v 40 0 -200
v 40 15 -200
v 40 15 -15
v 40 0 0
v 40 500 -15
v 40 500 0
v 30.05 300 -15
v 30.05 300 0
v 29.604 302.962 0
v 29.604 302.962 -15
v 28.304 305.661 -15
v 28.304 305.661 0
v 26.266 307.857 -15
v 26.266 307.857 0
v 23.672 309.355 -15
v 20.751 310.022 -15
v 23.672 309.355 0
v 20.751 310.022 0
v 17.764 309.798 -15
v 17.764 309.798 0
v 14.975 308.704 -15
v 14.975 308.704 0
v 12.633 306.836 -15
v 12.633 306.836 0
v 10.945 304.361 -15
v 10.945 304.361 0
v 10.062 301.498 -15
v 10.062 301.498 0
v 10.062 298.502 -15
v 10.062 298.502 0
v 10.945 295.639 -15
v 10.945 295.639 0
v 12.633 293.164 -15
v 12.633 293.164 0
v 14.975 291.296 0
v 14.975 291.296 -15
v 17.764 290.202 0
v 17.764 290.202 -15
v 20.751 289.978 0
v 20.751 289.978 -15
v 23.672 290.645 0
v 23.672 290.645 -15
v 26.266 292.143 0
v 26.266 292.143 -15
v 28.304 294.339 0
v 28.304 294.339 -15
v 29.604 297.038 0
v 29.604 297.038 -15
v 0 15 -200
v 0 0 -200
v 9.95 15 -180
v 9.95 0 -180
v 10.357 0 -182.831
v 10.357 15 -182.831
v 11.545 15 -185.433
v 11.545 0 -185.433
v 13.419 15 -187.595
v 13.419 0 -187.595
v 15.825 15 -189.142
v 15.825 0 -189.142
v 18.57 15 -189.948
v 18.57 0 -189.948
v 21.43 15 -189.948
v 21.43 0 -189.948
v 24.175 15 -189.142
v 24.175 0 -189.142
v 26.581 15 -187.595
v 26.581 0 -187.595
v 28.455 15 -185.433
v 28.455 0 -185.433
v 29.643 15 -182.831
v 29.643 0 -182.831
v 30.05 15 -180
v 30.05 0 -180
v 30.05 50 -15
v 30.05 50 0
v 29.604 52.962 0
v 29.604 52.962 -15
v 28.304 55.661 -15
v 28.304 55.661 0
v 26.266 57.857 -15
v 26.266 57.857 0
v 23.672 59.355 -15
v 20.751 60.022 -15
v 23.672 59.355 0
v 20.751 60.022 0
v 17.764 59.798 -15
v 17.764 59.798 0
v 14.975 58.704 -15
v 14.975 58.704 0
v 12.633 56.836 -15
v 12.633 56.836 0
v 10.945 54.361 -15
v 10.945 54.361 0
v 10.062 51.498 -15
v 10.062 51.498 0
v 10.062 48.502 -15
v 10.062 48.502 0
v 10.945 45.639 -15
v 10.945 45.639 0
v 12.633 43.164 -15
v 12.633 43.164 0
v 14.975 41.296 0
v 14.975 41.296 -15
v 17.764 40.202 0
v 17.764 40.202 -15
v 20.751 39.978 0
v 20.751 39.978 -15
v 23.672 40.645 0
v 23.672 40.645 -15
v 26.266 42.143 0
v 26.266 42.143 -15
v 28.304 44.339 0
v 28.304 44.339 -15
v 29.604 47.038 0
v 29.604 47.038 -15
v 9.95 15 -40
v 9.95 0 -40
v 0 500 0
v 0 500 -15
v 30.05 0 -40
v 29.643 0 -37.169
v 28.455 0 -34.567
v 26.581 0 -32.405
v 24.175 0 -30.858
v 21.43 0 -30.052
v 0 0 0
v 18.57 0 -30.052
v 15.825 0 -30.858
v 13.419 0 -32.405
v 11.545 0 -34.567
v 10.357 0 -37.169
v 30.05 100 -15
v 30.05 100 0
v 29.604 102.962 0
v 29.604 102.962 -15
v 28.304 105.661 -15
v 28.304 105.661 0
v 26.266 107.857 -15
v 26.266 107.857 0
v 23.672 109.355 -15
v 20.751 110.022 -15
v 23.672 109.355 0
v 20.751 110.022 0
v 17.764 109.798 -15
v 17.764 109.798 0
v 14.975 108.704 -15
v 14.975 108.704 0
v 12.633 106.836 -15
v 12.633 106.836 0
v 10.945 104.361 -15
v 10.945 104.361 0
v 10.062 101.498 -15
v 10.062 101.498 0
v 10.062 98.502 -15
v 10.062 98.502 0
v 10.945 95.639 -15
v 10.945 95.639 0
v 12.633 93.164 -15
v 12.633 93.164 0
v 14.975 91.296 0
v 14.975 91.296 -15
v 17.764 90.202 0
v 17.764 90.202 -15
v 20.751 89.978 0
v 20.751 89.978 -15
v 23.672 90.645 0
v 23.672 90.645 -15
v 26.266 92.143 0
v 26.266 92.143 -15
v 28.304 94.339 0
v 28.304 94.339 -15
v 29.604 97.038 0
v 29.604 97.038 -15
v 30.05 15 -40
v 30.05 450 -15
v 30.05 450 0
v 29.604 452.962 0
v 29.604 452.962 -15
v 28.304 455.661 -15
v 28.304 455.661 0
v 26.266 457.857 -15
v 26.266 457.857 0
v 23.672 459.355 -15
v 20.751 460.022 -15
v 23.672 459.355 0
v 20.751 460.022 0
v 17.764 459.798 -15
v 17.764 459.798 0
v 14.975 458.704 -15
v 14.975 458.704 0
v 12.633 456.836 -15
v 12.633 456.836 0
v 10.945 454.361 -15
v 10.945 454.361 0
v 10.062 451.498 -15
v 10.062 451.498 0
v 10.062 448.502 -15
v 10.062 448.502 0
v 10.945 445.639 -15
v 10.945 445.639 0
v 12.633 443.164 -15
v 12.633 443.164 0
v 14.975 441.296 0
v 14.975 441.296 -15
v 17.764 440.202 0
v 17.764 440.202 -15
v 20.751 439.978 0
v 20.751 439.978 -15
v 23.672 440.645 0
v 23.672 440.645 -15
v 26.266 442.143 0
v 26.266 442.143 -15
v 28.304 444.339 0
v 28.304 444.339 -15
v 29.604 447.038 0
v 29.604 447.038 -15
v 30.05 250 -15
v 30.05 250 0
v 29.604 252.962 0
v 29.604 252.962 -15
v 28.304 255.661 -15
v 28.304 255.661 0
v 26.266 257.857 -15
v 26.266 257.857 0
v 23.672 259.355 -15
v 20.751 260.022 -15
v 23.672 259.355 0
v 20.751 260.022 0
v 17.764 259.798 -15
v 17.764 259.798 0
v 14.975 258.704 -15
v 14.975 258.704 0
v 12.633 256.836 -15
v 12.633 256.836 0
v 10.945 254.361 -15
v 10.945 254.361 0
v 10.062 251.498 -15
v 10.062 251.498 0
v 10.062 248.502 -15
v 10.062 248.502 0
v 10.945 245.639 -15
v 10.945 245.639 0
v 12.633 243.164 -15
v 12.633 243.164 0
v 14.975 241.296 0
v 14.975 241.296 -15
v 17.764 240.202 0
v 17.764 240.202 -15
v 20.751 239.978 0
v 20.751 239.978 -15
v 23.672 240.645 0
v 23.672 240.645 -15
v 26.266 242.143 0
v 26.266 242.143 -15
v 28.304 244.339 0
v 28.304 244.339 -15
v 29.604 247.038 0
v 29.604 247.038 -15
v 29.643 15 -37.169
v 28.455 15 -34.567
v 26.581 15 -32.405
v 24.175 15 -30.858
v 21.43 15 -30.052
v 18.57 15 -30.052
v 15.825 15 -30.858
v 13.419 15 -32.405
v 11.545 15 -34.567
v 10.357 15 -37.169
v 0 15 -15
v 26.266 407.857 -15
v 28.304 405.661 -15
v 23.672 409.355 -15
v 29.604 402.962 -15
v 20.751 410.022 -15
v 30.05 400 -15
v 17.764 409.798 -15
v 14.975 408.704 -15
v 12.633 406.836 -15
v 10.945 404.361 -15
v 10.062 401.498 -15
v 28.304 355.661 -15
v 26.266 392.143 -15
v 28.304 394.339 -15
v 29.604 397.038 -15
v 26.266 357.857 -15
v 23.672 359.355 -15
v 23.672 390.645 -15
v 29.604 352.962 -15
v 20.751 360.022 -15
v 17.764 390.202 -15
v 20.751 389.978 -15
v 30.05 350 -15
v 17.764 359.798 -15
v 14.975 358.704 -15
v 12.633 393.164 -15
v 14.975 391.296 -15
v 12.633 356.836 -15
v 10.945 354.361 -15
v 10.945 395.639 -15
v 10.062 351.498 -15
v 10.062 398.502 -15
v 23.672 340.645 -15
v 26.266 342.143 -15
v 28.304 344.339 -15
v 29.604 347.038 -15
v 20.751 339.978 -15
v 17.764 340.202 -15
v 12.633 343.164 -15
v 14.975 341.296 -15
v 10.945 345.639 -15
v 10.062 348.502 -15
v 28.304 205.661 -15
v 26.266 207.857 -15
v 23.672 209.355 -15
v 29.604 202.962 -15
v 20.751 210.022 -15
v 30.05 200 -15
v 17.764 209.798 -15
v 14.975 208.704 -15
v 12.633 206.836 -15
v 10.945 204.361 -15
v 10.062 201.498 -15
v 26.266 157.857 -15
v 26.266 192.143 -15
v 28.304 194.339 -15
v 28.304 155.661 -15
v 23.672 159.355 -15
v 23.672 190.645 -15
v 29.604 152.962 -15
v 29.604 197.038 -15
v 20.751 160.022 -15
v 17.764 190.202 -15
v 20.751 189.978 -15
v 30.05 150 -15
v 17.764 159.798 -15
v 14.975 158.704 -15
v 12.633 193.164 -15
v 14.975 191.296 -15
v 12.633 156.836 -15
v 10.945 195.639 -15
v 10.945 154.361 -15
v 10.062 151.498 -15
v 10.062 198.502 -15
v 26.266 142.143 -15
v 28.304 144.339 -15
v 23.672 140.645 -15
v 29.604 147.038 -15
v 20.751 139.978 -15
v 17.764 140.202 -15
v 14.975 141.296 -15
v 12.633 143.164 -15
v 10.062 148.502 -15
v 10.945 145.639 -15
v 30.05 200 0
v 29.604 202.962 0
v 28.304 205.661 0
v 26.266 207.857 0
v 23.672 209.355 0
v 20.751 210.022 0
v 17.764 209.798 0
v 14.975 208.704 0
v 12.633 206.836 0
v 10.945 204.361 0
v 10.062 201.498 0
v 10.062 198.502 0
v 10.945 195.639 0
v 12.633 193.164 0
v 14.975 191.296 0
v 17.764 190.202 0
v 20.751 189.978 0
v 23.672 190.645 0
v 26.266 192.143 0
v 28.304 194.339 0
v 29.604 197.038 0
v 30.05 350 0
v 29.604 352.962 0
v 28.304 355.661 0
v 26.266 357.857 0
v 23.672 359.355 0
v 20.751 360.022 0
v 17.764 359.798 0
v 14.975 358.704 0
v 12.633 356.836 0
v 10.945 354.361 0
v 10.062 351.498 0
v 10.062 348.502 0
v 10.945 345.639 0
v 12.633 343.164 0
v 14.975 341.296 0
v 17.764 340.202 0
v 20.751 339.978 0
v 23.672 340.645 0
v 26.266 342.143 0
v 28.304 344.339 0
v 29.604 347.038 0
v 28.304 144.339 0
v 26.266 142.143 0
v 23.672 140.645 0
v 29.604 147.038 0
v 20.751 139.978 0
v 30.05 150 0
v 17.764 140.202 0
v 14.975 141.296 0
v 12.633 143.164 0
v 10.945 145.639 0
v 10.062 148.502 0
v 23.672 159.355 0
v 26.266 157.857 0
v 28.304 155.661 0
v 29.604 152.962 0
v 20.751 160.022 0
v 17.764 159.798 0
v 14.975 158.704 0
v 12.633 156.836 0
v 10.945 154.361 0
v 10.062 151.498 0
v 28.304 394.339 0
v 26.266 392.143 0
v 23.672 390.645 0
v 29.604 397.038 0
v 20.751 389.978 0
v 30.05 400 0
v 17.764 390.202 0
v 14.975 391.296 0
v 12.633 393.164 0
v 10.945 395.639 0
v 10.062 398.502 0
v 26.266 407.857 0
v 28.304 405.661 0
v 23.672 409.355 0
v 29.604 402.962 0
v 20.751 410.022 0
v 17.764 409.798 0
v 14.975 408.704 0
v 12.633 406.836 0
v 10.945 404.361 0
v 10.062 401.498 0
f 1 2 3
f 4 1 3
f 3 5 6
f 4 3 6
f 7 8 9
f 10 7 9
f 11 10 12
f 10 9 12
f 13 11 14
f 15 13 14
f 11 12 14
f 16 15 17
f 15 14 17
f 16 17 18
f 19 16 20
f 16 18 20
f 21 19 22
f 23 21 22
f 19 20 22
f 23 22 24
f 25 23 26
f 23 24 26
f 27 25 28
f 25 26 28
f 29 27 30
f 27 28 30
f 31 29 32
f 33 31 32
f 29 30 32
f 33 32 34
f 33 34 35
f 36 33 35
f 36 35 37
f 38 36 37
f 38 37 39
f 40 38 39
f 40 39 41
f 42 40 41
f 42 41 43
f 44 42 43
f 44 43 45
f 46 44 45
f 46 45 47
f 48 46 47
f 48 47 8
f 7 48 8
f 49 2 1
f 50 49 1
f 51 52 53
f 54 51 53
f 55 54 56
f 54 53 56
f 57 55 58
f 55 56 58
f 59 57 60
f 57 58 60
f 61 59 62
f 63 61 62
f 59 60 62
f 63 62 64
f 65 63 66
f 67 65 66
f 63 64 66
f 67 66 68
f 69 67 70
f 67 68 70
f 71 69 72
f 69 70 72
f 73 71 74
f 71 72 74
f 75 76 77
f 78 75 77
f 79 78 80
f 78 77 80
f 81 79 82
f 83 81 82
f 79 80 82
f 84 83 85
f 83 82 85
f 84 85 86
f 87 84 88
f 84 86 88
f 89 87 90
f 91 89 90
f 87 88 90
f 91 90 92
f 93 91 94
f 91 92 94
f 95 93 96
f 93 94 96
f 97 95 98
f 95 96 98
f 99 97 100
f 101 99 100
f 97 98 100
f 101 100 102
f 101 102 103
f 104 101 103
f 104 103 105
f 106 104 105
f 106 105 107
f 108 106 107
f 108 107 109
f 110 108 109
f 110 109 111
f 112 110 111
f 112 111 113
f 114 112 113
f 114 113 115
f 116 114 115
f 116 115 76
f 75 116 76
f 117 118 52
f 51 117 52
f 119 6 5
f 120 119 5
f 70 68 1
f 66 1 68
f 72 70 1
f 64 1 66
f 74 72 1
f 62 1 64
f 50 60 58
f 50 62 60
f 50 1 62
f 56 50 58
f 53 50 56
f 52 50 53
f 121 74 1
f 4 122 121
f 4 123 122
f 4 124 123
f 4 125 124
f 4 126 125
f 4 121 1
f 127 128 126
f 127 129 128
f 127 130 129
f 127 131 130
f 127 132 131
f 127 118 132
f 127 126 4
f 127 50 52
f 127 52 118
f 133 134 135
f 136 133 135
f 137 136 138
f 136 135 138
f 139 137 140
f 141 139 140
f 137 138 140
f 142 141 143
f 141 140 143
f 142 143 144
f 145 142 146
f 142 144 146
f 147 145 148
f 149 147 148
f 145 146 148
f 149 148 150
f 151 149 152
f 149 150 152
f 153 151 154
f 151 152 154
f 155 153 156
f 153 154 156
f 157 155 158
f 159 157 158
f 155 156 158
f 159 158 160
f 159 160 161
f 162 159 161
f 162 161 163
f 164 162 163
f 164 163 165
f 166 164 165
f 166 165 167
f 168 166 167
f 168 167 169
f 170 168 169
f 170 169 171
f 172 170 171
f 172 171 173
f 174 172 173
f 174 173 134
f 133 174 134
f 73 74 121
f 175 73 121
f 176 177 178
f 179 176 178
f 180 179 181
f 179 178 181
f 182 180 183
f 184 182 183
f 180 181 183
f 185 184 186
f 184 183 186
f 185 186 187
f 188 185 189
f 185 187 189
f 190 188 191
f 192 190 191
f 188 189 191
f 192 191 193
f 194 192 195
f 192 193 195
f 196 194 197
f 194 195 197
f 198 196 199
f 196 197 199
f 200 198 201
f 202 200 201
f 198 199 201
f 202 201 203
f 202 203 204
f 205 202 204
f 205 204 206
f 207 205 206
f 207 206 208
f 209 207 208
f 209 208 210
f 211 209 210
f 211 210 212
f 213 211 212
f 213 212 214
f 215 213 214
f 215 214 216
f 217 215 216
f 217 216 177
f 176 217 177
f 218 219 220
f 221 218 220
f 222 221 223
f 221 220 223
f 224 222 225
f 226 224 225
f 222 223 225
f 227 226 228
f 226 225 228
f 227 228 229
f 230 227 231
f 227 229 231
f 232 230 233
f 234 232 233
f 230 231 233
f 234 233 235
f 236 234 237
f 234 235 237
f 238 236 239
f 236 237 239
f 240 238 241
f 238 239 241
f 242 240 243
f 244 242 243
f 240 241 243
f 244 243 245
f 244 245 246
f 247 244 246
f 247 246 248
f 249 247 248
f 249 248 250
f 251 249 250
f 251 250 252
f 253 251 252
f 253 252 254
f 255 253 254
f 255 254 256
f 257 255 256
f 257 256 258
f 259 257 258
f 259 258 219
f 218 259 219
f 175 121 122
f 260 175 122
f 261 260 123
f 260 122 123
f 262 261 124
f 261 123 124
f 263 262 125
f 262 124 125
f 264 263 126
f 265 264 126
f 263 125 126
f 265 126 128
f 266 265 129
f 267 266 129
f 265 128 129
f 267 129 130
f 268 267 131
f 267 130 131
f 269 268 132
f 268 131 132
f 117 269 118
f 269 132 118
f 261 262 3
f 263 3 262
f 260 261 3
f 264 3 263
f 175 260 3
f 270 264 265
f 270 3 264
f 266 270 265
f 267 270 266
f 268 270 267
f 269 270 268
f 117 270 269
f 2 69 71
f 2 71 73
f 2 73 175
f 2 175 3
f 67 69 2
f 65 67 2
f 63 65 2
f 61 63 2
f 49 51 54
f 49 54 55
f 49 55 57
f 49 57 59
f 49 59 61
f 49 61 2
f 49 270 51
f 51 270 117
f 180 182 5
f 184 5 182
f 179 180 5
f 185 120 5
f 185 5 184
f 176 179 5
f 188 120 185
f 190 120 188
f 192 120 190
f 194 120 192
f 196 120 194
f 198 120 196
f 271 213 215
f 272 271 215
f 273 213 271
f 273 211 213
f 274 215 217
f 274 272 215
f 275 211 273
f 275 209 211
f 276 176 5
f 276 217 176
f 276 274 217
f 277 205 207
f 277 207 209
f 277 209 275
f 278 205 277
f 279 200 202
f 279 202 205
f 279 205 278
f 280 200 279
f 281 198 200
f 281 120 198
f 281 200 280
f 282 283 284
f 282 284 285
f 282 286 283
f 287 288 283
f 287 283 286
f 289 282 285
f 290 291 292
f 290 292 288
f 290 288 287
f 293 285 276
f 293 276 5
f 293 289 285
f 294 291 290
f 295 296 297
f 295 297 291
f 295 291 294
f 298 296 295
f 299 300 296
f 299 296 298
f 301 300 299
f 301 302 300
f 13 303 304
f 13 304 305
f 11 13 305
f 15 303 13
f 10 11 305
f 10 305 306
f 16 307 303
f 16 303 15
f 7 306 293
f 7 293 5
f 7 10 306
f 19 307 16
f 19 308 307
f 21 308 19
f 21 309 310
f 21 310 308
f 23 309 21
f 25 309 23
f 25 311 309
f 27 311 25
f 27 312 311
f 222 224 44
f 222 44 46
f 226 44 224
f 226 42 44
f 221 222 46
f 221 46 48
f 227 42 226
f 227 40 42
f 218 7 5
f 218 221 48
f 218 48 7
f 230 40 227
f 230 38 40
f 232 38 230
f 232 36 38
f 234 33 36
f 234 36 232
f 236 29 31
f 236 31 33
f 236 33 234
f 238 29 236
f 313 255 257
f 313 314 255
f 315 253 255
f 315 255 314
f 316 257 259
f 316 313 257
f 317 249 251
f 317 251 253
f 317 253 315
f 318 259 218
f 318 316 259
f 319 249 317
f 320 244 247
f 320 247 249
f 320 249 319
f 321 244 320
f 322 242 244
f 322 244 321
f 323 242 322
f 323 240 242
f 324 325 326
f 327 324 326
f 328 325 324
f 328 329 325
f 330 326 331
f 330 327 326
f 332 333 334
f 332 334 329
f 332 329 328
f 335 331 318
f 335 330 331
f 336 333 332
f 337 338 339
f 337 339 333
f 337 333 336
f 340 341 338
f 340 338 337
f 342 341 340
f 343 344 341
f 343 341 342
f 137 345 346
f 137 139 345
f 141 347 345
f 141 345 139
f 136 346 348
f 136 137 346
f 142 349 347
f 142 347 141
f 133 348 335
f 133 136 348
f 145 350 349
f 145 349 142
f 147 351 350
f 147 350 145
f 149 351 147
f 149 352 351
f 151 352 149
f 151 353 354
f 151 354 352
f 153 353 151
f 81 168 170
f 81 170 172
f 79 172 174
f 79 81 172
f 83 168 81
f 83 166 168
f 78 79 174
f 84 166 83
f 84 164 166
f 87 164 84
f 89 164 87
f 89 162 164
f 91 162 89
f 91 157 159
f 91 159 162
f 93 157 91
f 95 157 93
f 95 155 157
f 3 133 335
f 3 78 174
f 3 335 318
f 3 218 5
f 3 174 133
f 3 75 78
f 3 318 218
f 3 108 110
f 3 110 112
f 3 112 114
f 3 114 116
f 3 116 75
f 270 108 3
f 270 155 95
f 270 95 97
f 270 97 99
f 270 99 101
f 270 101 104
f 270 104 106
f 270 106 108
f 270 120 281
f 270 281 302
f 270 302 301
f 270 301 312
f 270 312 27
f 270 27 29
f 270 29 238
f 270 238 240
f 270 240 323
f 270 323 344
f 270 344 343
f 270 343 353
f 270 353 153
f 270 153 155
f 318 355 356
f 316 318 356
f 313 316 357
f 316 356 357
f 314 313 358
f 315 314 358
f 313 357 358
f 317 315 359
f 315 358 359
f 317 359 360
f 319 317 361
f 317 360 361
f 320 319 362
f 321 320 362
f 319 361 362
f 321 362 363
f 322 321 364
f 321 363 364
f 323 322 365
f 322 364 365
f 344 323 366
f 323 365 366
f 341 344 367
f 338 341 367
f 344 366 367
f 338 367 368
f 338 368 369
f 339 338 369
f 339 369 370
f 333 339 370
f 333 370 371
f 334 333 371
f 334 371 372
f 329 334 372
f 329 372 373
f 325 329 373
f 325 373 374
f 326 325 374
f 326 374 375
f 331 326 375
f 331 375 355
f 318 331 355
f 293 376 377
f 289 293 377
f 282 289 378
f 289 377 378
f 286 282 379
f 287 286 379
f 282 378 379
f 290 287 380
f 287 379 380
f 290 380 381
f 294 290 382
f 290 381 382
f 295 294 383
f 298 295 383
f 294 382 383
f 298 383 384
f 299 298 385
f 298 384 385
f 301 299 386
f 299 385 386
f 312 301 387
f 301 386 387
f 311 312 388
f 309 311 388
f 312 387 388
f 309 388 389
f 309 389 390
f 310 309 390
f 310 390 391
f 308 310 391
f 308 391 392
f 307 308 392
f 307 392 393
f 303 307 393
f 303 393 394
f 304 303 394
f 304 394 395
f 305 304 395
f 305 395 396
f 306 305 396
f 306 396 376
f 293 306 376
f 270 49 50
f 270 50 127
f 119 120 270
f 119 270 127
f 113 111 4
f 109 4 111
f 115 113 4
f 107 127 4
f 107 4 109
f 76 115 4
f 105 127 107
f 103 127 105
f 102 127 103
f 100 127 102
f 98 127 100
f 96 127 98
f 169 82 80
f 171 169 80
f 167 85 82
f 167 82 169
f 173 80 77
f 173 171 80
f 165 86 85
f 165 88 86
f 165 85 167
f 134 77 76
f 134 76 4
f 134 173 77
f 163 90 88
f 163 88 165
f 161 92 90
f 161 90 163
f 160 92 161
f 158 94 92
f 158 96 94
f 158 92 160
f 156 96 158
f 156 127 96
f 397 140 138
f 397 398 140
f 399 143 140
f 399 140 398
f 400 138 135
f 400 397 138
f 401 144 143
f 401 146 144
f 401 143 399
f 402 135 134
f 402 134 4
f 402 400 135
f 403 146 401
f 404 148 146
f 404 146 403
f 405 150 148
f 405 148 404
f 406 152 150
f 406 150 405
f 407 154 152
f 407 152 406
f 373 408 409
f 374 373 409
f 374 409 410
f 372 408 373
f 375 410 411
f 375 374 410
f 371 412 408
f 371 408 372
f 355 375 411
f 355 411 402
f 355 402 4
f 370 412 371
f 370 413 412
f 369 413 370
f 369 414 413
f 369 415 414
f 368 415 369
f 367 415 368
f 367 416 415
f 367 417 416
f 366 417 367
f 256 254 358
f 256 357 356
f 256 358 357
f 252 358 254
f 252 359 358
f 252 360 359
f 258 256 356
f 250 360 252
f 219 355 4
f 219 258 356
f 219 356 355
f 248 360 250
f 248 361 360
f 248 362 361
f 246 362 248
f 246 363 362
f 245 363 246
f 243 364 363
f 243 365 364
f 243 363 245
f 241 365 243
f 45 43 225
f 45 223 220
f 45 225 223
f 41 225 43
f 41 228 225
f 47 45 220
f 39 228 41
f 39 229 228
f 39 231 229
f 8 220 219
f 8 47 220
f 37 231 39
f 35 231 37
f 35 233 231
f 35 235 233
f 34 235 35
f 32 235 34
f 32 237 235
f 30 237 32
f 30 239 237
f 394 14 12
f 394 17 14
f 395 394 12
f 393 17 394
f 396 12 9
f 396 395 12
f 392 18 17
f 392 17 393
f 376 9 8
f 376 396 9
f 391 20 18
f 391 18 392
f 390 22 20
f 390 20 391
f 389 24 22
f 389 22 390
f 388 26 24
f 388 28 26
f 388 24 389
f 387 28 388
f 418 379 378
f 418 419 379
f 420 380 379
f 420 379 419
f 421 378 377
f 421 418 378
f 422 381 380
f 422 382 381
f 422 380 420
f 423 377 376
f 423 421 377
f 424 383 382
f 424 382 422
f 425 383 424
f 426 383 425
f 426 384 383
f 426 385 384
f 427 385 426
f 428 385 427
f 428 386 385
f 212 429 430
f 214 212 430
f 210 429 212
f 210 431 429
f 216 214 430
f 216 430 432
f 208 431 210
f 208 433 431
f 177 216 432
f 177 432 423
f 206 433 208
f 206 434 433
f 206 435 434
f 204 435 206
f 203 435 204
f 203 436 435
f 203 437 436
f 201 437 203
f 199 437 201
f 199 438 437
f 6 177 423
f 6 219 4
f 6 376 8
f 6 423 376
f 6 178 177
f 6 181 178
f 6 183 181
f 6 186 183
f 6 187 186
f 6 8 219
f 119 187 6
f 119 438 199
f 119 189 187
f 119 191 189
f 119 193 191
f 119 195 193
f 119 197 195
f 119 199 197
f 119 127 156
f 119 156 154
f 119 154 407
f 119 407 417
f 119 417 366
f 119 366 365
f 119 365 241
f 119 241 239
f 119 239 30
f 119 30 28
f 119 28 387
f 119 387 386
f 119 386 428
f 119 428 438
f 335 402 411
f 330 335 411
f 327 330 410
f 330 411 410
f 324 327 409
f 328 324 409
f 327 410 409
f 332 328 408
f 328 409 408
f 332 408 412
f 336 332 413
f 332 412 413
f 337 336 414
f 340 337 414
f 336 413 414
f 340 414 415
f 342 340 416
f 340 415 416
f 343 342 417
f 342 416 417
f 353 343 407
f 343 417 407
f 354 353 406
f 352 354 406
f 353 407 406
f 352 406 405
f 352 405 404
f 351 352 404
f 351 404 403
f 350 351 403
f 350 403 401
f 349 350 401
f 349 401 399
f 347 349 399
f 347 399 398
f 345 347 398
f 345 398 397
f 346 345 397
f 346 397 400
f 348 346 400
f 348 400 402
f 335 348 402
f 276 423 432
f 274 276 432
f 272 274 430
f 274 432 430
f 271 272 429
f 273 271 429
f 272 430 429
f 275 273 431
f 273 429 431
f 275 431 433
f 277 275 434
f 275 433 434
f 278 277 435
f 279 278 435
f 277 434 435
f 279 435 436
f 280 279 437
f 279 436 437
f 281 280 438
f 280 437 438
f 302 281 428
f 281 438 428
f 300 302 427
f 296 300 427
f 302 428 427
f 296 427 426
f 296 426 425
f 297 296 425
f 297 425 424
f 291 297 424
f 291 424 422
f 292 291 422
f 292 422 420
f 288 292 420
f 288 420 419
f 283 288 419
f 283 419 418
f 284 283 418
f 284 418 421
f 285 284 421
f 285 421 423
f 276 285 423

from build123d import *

# Parameters (mm, degrees)
EXTRUDE_1_DEPTH     = 40
SKETCH_2_R          = 10.05
CUT_EXTRUDE_1_DEPTH = 201
CUT_EXTRUDE_2_REACH = 502


with BuildPart() as part:
    # Эскиз1 → Бобышка-Вытянуть1 (new body)
    with BuildSketch(Plane(origin=(0, 0, 0), x_dir=(0, 0, -1), z_dir=(1, 0, 0))):
        Polygon((0, 0), (0, 500), (15, 500), (15, 15), (200, 15), (200, 0), align=None)
    extrude(amount=EXTRUDE_1_DEPTH)

    # Эскиз2 → Вырез-Вытянуть1 (cut, through all)
    with BuildSketch(Plane.XY):
        with Locations((20, 50)):
            Circle(SKETCH_2_R)
        with Locations((20, 100)):
            Circle(SKETCH_2_R)
        with Locations((20, 150)):
            Circle(SKETCH_2_R)
        with Locations((20, 200)):
            Circle(SKETCH_2_R)
        with Locations((20, 250)):
            Circle(SKETCH_2_R)
        with Locations((20, 300)):
            Circle(SKETCH_2_R)
        with Locations((20, 350)):
            Circle(SKETCH_2_R)
        with Locations((20, 400)):
            Circle(SKETCH_2_R)
        with Locations((20, 450)):
            Circle(SKETCH_2_R)
    extrude(amount=-CUT_EXTRUDE_1_DEPTH, mode=Mode.SUBTRACT)

    # Эскиз3 → Вырез-Вытянуть2 (cut, up to next)
    with BuildSketch(Plane.XZ, mode=Mode.PRIVATE) as cut_extrude_2_sk1:
        with BuildLine():
            Line((9.95, -40), (9.95, -180))
            ThreePointArc((9.95, -180), (20, -190.05), (30.05, -180))
            Line((30.05, -180), (30.05, -40))
            ThreePointArc((30.05, -40), (20, -29.95), (9.95, -40))
        make_face()
    cut_extrude_2_tool1 = extrude(cut_extrude_2_sk1.sketch, amount=-CUT_EXTRUDE_2_REACH, mode=Mode.PRIVATE) & part.part
    add(cut_extrude_2_tool1.solids().sort_by_distance((20, 0, -110))[0], mode=Mode.SUBTRACT)


solid = part.part
